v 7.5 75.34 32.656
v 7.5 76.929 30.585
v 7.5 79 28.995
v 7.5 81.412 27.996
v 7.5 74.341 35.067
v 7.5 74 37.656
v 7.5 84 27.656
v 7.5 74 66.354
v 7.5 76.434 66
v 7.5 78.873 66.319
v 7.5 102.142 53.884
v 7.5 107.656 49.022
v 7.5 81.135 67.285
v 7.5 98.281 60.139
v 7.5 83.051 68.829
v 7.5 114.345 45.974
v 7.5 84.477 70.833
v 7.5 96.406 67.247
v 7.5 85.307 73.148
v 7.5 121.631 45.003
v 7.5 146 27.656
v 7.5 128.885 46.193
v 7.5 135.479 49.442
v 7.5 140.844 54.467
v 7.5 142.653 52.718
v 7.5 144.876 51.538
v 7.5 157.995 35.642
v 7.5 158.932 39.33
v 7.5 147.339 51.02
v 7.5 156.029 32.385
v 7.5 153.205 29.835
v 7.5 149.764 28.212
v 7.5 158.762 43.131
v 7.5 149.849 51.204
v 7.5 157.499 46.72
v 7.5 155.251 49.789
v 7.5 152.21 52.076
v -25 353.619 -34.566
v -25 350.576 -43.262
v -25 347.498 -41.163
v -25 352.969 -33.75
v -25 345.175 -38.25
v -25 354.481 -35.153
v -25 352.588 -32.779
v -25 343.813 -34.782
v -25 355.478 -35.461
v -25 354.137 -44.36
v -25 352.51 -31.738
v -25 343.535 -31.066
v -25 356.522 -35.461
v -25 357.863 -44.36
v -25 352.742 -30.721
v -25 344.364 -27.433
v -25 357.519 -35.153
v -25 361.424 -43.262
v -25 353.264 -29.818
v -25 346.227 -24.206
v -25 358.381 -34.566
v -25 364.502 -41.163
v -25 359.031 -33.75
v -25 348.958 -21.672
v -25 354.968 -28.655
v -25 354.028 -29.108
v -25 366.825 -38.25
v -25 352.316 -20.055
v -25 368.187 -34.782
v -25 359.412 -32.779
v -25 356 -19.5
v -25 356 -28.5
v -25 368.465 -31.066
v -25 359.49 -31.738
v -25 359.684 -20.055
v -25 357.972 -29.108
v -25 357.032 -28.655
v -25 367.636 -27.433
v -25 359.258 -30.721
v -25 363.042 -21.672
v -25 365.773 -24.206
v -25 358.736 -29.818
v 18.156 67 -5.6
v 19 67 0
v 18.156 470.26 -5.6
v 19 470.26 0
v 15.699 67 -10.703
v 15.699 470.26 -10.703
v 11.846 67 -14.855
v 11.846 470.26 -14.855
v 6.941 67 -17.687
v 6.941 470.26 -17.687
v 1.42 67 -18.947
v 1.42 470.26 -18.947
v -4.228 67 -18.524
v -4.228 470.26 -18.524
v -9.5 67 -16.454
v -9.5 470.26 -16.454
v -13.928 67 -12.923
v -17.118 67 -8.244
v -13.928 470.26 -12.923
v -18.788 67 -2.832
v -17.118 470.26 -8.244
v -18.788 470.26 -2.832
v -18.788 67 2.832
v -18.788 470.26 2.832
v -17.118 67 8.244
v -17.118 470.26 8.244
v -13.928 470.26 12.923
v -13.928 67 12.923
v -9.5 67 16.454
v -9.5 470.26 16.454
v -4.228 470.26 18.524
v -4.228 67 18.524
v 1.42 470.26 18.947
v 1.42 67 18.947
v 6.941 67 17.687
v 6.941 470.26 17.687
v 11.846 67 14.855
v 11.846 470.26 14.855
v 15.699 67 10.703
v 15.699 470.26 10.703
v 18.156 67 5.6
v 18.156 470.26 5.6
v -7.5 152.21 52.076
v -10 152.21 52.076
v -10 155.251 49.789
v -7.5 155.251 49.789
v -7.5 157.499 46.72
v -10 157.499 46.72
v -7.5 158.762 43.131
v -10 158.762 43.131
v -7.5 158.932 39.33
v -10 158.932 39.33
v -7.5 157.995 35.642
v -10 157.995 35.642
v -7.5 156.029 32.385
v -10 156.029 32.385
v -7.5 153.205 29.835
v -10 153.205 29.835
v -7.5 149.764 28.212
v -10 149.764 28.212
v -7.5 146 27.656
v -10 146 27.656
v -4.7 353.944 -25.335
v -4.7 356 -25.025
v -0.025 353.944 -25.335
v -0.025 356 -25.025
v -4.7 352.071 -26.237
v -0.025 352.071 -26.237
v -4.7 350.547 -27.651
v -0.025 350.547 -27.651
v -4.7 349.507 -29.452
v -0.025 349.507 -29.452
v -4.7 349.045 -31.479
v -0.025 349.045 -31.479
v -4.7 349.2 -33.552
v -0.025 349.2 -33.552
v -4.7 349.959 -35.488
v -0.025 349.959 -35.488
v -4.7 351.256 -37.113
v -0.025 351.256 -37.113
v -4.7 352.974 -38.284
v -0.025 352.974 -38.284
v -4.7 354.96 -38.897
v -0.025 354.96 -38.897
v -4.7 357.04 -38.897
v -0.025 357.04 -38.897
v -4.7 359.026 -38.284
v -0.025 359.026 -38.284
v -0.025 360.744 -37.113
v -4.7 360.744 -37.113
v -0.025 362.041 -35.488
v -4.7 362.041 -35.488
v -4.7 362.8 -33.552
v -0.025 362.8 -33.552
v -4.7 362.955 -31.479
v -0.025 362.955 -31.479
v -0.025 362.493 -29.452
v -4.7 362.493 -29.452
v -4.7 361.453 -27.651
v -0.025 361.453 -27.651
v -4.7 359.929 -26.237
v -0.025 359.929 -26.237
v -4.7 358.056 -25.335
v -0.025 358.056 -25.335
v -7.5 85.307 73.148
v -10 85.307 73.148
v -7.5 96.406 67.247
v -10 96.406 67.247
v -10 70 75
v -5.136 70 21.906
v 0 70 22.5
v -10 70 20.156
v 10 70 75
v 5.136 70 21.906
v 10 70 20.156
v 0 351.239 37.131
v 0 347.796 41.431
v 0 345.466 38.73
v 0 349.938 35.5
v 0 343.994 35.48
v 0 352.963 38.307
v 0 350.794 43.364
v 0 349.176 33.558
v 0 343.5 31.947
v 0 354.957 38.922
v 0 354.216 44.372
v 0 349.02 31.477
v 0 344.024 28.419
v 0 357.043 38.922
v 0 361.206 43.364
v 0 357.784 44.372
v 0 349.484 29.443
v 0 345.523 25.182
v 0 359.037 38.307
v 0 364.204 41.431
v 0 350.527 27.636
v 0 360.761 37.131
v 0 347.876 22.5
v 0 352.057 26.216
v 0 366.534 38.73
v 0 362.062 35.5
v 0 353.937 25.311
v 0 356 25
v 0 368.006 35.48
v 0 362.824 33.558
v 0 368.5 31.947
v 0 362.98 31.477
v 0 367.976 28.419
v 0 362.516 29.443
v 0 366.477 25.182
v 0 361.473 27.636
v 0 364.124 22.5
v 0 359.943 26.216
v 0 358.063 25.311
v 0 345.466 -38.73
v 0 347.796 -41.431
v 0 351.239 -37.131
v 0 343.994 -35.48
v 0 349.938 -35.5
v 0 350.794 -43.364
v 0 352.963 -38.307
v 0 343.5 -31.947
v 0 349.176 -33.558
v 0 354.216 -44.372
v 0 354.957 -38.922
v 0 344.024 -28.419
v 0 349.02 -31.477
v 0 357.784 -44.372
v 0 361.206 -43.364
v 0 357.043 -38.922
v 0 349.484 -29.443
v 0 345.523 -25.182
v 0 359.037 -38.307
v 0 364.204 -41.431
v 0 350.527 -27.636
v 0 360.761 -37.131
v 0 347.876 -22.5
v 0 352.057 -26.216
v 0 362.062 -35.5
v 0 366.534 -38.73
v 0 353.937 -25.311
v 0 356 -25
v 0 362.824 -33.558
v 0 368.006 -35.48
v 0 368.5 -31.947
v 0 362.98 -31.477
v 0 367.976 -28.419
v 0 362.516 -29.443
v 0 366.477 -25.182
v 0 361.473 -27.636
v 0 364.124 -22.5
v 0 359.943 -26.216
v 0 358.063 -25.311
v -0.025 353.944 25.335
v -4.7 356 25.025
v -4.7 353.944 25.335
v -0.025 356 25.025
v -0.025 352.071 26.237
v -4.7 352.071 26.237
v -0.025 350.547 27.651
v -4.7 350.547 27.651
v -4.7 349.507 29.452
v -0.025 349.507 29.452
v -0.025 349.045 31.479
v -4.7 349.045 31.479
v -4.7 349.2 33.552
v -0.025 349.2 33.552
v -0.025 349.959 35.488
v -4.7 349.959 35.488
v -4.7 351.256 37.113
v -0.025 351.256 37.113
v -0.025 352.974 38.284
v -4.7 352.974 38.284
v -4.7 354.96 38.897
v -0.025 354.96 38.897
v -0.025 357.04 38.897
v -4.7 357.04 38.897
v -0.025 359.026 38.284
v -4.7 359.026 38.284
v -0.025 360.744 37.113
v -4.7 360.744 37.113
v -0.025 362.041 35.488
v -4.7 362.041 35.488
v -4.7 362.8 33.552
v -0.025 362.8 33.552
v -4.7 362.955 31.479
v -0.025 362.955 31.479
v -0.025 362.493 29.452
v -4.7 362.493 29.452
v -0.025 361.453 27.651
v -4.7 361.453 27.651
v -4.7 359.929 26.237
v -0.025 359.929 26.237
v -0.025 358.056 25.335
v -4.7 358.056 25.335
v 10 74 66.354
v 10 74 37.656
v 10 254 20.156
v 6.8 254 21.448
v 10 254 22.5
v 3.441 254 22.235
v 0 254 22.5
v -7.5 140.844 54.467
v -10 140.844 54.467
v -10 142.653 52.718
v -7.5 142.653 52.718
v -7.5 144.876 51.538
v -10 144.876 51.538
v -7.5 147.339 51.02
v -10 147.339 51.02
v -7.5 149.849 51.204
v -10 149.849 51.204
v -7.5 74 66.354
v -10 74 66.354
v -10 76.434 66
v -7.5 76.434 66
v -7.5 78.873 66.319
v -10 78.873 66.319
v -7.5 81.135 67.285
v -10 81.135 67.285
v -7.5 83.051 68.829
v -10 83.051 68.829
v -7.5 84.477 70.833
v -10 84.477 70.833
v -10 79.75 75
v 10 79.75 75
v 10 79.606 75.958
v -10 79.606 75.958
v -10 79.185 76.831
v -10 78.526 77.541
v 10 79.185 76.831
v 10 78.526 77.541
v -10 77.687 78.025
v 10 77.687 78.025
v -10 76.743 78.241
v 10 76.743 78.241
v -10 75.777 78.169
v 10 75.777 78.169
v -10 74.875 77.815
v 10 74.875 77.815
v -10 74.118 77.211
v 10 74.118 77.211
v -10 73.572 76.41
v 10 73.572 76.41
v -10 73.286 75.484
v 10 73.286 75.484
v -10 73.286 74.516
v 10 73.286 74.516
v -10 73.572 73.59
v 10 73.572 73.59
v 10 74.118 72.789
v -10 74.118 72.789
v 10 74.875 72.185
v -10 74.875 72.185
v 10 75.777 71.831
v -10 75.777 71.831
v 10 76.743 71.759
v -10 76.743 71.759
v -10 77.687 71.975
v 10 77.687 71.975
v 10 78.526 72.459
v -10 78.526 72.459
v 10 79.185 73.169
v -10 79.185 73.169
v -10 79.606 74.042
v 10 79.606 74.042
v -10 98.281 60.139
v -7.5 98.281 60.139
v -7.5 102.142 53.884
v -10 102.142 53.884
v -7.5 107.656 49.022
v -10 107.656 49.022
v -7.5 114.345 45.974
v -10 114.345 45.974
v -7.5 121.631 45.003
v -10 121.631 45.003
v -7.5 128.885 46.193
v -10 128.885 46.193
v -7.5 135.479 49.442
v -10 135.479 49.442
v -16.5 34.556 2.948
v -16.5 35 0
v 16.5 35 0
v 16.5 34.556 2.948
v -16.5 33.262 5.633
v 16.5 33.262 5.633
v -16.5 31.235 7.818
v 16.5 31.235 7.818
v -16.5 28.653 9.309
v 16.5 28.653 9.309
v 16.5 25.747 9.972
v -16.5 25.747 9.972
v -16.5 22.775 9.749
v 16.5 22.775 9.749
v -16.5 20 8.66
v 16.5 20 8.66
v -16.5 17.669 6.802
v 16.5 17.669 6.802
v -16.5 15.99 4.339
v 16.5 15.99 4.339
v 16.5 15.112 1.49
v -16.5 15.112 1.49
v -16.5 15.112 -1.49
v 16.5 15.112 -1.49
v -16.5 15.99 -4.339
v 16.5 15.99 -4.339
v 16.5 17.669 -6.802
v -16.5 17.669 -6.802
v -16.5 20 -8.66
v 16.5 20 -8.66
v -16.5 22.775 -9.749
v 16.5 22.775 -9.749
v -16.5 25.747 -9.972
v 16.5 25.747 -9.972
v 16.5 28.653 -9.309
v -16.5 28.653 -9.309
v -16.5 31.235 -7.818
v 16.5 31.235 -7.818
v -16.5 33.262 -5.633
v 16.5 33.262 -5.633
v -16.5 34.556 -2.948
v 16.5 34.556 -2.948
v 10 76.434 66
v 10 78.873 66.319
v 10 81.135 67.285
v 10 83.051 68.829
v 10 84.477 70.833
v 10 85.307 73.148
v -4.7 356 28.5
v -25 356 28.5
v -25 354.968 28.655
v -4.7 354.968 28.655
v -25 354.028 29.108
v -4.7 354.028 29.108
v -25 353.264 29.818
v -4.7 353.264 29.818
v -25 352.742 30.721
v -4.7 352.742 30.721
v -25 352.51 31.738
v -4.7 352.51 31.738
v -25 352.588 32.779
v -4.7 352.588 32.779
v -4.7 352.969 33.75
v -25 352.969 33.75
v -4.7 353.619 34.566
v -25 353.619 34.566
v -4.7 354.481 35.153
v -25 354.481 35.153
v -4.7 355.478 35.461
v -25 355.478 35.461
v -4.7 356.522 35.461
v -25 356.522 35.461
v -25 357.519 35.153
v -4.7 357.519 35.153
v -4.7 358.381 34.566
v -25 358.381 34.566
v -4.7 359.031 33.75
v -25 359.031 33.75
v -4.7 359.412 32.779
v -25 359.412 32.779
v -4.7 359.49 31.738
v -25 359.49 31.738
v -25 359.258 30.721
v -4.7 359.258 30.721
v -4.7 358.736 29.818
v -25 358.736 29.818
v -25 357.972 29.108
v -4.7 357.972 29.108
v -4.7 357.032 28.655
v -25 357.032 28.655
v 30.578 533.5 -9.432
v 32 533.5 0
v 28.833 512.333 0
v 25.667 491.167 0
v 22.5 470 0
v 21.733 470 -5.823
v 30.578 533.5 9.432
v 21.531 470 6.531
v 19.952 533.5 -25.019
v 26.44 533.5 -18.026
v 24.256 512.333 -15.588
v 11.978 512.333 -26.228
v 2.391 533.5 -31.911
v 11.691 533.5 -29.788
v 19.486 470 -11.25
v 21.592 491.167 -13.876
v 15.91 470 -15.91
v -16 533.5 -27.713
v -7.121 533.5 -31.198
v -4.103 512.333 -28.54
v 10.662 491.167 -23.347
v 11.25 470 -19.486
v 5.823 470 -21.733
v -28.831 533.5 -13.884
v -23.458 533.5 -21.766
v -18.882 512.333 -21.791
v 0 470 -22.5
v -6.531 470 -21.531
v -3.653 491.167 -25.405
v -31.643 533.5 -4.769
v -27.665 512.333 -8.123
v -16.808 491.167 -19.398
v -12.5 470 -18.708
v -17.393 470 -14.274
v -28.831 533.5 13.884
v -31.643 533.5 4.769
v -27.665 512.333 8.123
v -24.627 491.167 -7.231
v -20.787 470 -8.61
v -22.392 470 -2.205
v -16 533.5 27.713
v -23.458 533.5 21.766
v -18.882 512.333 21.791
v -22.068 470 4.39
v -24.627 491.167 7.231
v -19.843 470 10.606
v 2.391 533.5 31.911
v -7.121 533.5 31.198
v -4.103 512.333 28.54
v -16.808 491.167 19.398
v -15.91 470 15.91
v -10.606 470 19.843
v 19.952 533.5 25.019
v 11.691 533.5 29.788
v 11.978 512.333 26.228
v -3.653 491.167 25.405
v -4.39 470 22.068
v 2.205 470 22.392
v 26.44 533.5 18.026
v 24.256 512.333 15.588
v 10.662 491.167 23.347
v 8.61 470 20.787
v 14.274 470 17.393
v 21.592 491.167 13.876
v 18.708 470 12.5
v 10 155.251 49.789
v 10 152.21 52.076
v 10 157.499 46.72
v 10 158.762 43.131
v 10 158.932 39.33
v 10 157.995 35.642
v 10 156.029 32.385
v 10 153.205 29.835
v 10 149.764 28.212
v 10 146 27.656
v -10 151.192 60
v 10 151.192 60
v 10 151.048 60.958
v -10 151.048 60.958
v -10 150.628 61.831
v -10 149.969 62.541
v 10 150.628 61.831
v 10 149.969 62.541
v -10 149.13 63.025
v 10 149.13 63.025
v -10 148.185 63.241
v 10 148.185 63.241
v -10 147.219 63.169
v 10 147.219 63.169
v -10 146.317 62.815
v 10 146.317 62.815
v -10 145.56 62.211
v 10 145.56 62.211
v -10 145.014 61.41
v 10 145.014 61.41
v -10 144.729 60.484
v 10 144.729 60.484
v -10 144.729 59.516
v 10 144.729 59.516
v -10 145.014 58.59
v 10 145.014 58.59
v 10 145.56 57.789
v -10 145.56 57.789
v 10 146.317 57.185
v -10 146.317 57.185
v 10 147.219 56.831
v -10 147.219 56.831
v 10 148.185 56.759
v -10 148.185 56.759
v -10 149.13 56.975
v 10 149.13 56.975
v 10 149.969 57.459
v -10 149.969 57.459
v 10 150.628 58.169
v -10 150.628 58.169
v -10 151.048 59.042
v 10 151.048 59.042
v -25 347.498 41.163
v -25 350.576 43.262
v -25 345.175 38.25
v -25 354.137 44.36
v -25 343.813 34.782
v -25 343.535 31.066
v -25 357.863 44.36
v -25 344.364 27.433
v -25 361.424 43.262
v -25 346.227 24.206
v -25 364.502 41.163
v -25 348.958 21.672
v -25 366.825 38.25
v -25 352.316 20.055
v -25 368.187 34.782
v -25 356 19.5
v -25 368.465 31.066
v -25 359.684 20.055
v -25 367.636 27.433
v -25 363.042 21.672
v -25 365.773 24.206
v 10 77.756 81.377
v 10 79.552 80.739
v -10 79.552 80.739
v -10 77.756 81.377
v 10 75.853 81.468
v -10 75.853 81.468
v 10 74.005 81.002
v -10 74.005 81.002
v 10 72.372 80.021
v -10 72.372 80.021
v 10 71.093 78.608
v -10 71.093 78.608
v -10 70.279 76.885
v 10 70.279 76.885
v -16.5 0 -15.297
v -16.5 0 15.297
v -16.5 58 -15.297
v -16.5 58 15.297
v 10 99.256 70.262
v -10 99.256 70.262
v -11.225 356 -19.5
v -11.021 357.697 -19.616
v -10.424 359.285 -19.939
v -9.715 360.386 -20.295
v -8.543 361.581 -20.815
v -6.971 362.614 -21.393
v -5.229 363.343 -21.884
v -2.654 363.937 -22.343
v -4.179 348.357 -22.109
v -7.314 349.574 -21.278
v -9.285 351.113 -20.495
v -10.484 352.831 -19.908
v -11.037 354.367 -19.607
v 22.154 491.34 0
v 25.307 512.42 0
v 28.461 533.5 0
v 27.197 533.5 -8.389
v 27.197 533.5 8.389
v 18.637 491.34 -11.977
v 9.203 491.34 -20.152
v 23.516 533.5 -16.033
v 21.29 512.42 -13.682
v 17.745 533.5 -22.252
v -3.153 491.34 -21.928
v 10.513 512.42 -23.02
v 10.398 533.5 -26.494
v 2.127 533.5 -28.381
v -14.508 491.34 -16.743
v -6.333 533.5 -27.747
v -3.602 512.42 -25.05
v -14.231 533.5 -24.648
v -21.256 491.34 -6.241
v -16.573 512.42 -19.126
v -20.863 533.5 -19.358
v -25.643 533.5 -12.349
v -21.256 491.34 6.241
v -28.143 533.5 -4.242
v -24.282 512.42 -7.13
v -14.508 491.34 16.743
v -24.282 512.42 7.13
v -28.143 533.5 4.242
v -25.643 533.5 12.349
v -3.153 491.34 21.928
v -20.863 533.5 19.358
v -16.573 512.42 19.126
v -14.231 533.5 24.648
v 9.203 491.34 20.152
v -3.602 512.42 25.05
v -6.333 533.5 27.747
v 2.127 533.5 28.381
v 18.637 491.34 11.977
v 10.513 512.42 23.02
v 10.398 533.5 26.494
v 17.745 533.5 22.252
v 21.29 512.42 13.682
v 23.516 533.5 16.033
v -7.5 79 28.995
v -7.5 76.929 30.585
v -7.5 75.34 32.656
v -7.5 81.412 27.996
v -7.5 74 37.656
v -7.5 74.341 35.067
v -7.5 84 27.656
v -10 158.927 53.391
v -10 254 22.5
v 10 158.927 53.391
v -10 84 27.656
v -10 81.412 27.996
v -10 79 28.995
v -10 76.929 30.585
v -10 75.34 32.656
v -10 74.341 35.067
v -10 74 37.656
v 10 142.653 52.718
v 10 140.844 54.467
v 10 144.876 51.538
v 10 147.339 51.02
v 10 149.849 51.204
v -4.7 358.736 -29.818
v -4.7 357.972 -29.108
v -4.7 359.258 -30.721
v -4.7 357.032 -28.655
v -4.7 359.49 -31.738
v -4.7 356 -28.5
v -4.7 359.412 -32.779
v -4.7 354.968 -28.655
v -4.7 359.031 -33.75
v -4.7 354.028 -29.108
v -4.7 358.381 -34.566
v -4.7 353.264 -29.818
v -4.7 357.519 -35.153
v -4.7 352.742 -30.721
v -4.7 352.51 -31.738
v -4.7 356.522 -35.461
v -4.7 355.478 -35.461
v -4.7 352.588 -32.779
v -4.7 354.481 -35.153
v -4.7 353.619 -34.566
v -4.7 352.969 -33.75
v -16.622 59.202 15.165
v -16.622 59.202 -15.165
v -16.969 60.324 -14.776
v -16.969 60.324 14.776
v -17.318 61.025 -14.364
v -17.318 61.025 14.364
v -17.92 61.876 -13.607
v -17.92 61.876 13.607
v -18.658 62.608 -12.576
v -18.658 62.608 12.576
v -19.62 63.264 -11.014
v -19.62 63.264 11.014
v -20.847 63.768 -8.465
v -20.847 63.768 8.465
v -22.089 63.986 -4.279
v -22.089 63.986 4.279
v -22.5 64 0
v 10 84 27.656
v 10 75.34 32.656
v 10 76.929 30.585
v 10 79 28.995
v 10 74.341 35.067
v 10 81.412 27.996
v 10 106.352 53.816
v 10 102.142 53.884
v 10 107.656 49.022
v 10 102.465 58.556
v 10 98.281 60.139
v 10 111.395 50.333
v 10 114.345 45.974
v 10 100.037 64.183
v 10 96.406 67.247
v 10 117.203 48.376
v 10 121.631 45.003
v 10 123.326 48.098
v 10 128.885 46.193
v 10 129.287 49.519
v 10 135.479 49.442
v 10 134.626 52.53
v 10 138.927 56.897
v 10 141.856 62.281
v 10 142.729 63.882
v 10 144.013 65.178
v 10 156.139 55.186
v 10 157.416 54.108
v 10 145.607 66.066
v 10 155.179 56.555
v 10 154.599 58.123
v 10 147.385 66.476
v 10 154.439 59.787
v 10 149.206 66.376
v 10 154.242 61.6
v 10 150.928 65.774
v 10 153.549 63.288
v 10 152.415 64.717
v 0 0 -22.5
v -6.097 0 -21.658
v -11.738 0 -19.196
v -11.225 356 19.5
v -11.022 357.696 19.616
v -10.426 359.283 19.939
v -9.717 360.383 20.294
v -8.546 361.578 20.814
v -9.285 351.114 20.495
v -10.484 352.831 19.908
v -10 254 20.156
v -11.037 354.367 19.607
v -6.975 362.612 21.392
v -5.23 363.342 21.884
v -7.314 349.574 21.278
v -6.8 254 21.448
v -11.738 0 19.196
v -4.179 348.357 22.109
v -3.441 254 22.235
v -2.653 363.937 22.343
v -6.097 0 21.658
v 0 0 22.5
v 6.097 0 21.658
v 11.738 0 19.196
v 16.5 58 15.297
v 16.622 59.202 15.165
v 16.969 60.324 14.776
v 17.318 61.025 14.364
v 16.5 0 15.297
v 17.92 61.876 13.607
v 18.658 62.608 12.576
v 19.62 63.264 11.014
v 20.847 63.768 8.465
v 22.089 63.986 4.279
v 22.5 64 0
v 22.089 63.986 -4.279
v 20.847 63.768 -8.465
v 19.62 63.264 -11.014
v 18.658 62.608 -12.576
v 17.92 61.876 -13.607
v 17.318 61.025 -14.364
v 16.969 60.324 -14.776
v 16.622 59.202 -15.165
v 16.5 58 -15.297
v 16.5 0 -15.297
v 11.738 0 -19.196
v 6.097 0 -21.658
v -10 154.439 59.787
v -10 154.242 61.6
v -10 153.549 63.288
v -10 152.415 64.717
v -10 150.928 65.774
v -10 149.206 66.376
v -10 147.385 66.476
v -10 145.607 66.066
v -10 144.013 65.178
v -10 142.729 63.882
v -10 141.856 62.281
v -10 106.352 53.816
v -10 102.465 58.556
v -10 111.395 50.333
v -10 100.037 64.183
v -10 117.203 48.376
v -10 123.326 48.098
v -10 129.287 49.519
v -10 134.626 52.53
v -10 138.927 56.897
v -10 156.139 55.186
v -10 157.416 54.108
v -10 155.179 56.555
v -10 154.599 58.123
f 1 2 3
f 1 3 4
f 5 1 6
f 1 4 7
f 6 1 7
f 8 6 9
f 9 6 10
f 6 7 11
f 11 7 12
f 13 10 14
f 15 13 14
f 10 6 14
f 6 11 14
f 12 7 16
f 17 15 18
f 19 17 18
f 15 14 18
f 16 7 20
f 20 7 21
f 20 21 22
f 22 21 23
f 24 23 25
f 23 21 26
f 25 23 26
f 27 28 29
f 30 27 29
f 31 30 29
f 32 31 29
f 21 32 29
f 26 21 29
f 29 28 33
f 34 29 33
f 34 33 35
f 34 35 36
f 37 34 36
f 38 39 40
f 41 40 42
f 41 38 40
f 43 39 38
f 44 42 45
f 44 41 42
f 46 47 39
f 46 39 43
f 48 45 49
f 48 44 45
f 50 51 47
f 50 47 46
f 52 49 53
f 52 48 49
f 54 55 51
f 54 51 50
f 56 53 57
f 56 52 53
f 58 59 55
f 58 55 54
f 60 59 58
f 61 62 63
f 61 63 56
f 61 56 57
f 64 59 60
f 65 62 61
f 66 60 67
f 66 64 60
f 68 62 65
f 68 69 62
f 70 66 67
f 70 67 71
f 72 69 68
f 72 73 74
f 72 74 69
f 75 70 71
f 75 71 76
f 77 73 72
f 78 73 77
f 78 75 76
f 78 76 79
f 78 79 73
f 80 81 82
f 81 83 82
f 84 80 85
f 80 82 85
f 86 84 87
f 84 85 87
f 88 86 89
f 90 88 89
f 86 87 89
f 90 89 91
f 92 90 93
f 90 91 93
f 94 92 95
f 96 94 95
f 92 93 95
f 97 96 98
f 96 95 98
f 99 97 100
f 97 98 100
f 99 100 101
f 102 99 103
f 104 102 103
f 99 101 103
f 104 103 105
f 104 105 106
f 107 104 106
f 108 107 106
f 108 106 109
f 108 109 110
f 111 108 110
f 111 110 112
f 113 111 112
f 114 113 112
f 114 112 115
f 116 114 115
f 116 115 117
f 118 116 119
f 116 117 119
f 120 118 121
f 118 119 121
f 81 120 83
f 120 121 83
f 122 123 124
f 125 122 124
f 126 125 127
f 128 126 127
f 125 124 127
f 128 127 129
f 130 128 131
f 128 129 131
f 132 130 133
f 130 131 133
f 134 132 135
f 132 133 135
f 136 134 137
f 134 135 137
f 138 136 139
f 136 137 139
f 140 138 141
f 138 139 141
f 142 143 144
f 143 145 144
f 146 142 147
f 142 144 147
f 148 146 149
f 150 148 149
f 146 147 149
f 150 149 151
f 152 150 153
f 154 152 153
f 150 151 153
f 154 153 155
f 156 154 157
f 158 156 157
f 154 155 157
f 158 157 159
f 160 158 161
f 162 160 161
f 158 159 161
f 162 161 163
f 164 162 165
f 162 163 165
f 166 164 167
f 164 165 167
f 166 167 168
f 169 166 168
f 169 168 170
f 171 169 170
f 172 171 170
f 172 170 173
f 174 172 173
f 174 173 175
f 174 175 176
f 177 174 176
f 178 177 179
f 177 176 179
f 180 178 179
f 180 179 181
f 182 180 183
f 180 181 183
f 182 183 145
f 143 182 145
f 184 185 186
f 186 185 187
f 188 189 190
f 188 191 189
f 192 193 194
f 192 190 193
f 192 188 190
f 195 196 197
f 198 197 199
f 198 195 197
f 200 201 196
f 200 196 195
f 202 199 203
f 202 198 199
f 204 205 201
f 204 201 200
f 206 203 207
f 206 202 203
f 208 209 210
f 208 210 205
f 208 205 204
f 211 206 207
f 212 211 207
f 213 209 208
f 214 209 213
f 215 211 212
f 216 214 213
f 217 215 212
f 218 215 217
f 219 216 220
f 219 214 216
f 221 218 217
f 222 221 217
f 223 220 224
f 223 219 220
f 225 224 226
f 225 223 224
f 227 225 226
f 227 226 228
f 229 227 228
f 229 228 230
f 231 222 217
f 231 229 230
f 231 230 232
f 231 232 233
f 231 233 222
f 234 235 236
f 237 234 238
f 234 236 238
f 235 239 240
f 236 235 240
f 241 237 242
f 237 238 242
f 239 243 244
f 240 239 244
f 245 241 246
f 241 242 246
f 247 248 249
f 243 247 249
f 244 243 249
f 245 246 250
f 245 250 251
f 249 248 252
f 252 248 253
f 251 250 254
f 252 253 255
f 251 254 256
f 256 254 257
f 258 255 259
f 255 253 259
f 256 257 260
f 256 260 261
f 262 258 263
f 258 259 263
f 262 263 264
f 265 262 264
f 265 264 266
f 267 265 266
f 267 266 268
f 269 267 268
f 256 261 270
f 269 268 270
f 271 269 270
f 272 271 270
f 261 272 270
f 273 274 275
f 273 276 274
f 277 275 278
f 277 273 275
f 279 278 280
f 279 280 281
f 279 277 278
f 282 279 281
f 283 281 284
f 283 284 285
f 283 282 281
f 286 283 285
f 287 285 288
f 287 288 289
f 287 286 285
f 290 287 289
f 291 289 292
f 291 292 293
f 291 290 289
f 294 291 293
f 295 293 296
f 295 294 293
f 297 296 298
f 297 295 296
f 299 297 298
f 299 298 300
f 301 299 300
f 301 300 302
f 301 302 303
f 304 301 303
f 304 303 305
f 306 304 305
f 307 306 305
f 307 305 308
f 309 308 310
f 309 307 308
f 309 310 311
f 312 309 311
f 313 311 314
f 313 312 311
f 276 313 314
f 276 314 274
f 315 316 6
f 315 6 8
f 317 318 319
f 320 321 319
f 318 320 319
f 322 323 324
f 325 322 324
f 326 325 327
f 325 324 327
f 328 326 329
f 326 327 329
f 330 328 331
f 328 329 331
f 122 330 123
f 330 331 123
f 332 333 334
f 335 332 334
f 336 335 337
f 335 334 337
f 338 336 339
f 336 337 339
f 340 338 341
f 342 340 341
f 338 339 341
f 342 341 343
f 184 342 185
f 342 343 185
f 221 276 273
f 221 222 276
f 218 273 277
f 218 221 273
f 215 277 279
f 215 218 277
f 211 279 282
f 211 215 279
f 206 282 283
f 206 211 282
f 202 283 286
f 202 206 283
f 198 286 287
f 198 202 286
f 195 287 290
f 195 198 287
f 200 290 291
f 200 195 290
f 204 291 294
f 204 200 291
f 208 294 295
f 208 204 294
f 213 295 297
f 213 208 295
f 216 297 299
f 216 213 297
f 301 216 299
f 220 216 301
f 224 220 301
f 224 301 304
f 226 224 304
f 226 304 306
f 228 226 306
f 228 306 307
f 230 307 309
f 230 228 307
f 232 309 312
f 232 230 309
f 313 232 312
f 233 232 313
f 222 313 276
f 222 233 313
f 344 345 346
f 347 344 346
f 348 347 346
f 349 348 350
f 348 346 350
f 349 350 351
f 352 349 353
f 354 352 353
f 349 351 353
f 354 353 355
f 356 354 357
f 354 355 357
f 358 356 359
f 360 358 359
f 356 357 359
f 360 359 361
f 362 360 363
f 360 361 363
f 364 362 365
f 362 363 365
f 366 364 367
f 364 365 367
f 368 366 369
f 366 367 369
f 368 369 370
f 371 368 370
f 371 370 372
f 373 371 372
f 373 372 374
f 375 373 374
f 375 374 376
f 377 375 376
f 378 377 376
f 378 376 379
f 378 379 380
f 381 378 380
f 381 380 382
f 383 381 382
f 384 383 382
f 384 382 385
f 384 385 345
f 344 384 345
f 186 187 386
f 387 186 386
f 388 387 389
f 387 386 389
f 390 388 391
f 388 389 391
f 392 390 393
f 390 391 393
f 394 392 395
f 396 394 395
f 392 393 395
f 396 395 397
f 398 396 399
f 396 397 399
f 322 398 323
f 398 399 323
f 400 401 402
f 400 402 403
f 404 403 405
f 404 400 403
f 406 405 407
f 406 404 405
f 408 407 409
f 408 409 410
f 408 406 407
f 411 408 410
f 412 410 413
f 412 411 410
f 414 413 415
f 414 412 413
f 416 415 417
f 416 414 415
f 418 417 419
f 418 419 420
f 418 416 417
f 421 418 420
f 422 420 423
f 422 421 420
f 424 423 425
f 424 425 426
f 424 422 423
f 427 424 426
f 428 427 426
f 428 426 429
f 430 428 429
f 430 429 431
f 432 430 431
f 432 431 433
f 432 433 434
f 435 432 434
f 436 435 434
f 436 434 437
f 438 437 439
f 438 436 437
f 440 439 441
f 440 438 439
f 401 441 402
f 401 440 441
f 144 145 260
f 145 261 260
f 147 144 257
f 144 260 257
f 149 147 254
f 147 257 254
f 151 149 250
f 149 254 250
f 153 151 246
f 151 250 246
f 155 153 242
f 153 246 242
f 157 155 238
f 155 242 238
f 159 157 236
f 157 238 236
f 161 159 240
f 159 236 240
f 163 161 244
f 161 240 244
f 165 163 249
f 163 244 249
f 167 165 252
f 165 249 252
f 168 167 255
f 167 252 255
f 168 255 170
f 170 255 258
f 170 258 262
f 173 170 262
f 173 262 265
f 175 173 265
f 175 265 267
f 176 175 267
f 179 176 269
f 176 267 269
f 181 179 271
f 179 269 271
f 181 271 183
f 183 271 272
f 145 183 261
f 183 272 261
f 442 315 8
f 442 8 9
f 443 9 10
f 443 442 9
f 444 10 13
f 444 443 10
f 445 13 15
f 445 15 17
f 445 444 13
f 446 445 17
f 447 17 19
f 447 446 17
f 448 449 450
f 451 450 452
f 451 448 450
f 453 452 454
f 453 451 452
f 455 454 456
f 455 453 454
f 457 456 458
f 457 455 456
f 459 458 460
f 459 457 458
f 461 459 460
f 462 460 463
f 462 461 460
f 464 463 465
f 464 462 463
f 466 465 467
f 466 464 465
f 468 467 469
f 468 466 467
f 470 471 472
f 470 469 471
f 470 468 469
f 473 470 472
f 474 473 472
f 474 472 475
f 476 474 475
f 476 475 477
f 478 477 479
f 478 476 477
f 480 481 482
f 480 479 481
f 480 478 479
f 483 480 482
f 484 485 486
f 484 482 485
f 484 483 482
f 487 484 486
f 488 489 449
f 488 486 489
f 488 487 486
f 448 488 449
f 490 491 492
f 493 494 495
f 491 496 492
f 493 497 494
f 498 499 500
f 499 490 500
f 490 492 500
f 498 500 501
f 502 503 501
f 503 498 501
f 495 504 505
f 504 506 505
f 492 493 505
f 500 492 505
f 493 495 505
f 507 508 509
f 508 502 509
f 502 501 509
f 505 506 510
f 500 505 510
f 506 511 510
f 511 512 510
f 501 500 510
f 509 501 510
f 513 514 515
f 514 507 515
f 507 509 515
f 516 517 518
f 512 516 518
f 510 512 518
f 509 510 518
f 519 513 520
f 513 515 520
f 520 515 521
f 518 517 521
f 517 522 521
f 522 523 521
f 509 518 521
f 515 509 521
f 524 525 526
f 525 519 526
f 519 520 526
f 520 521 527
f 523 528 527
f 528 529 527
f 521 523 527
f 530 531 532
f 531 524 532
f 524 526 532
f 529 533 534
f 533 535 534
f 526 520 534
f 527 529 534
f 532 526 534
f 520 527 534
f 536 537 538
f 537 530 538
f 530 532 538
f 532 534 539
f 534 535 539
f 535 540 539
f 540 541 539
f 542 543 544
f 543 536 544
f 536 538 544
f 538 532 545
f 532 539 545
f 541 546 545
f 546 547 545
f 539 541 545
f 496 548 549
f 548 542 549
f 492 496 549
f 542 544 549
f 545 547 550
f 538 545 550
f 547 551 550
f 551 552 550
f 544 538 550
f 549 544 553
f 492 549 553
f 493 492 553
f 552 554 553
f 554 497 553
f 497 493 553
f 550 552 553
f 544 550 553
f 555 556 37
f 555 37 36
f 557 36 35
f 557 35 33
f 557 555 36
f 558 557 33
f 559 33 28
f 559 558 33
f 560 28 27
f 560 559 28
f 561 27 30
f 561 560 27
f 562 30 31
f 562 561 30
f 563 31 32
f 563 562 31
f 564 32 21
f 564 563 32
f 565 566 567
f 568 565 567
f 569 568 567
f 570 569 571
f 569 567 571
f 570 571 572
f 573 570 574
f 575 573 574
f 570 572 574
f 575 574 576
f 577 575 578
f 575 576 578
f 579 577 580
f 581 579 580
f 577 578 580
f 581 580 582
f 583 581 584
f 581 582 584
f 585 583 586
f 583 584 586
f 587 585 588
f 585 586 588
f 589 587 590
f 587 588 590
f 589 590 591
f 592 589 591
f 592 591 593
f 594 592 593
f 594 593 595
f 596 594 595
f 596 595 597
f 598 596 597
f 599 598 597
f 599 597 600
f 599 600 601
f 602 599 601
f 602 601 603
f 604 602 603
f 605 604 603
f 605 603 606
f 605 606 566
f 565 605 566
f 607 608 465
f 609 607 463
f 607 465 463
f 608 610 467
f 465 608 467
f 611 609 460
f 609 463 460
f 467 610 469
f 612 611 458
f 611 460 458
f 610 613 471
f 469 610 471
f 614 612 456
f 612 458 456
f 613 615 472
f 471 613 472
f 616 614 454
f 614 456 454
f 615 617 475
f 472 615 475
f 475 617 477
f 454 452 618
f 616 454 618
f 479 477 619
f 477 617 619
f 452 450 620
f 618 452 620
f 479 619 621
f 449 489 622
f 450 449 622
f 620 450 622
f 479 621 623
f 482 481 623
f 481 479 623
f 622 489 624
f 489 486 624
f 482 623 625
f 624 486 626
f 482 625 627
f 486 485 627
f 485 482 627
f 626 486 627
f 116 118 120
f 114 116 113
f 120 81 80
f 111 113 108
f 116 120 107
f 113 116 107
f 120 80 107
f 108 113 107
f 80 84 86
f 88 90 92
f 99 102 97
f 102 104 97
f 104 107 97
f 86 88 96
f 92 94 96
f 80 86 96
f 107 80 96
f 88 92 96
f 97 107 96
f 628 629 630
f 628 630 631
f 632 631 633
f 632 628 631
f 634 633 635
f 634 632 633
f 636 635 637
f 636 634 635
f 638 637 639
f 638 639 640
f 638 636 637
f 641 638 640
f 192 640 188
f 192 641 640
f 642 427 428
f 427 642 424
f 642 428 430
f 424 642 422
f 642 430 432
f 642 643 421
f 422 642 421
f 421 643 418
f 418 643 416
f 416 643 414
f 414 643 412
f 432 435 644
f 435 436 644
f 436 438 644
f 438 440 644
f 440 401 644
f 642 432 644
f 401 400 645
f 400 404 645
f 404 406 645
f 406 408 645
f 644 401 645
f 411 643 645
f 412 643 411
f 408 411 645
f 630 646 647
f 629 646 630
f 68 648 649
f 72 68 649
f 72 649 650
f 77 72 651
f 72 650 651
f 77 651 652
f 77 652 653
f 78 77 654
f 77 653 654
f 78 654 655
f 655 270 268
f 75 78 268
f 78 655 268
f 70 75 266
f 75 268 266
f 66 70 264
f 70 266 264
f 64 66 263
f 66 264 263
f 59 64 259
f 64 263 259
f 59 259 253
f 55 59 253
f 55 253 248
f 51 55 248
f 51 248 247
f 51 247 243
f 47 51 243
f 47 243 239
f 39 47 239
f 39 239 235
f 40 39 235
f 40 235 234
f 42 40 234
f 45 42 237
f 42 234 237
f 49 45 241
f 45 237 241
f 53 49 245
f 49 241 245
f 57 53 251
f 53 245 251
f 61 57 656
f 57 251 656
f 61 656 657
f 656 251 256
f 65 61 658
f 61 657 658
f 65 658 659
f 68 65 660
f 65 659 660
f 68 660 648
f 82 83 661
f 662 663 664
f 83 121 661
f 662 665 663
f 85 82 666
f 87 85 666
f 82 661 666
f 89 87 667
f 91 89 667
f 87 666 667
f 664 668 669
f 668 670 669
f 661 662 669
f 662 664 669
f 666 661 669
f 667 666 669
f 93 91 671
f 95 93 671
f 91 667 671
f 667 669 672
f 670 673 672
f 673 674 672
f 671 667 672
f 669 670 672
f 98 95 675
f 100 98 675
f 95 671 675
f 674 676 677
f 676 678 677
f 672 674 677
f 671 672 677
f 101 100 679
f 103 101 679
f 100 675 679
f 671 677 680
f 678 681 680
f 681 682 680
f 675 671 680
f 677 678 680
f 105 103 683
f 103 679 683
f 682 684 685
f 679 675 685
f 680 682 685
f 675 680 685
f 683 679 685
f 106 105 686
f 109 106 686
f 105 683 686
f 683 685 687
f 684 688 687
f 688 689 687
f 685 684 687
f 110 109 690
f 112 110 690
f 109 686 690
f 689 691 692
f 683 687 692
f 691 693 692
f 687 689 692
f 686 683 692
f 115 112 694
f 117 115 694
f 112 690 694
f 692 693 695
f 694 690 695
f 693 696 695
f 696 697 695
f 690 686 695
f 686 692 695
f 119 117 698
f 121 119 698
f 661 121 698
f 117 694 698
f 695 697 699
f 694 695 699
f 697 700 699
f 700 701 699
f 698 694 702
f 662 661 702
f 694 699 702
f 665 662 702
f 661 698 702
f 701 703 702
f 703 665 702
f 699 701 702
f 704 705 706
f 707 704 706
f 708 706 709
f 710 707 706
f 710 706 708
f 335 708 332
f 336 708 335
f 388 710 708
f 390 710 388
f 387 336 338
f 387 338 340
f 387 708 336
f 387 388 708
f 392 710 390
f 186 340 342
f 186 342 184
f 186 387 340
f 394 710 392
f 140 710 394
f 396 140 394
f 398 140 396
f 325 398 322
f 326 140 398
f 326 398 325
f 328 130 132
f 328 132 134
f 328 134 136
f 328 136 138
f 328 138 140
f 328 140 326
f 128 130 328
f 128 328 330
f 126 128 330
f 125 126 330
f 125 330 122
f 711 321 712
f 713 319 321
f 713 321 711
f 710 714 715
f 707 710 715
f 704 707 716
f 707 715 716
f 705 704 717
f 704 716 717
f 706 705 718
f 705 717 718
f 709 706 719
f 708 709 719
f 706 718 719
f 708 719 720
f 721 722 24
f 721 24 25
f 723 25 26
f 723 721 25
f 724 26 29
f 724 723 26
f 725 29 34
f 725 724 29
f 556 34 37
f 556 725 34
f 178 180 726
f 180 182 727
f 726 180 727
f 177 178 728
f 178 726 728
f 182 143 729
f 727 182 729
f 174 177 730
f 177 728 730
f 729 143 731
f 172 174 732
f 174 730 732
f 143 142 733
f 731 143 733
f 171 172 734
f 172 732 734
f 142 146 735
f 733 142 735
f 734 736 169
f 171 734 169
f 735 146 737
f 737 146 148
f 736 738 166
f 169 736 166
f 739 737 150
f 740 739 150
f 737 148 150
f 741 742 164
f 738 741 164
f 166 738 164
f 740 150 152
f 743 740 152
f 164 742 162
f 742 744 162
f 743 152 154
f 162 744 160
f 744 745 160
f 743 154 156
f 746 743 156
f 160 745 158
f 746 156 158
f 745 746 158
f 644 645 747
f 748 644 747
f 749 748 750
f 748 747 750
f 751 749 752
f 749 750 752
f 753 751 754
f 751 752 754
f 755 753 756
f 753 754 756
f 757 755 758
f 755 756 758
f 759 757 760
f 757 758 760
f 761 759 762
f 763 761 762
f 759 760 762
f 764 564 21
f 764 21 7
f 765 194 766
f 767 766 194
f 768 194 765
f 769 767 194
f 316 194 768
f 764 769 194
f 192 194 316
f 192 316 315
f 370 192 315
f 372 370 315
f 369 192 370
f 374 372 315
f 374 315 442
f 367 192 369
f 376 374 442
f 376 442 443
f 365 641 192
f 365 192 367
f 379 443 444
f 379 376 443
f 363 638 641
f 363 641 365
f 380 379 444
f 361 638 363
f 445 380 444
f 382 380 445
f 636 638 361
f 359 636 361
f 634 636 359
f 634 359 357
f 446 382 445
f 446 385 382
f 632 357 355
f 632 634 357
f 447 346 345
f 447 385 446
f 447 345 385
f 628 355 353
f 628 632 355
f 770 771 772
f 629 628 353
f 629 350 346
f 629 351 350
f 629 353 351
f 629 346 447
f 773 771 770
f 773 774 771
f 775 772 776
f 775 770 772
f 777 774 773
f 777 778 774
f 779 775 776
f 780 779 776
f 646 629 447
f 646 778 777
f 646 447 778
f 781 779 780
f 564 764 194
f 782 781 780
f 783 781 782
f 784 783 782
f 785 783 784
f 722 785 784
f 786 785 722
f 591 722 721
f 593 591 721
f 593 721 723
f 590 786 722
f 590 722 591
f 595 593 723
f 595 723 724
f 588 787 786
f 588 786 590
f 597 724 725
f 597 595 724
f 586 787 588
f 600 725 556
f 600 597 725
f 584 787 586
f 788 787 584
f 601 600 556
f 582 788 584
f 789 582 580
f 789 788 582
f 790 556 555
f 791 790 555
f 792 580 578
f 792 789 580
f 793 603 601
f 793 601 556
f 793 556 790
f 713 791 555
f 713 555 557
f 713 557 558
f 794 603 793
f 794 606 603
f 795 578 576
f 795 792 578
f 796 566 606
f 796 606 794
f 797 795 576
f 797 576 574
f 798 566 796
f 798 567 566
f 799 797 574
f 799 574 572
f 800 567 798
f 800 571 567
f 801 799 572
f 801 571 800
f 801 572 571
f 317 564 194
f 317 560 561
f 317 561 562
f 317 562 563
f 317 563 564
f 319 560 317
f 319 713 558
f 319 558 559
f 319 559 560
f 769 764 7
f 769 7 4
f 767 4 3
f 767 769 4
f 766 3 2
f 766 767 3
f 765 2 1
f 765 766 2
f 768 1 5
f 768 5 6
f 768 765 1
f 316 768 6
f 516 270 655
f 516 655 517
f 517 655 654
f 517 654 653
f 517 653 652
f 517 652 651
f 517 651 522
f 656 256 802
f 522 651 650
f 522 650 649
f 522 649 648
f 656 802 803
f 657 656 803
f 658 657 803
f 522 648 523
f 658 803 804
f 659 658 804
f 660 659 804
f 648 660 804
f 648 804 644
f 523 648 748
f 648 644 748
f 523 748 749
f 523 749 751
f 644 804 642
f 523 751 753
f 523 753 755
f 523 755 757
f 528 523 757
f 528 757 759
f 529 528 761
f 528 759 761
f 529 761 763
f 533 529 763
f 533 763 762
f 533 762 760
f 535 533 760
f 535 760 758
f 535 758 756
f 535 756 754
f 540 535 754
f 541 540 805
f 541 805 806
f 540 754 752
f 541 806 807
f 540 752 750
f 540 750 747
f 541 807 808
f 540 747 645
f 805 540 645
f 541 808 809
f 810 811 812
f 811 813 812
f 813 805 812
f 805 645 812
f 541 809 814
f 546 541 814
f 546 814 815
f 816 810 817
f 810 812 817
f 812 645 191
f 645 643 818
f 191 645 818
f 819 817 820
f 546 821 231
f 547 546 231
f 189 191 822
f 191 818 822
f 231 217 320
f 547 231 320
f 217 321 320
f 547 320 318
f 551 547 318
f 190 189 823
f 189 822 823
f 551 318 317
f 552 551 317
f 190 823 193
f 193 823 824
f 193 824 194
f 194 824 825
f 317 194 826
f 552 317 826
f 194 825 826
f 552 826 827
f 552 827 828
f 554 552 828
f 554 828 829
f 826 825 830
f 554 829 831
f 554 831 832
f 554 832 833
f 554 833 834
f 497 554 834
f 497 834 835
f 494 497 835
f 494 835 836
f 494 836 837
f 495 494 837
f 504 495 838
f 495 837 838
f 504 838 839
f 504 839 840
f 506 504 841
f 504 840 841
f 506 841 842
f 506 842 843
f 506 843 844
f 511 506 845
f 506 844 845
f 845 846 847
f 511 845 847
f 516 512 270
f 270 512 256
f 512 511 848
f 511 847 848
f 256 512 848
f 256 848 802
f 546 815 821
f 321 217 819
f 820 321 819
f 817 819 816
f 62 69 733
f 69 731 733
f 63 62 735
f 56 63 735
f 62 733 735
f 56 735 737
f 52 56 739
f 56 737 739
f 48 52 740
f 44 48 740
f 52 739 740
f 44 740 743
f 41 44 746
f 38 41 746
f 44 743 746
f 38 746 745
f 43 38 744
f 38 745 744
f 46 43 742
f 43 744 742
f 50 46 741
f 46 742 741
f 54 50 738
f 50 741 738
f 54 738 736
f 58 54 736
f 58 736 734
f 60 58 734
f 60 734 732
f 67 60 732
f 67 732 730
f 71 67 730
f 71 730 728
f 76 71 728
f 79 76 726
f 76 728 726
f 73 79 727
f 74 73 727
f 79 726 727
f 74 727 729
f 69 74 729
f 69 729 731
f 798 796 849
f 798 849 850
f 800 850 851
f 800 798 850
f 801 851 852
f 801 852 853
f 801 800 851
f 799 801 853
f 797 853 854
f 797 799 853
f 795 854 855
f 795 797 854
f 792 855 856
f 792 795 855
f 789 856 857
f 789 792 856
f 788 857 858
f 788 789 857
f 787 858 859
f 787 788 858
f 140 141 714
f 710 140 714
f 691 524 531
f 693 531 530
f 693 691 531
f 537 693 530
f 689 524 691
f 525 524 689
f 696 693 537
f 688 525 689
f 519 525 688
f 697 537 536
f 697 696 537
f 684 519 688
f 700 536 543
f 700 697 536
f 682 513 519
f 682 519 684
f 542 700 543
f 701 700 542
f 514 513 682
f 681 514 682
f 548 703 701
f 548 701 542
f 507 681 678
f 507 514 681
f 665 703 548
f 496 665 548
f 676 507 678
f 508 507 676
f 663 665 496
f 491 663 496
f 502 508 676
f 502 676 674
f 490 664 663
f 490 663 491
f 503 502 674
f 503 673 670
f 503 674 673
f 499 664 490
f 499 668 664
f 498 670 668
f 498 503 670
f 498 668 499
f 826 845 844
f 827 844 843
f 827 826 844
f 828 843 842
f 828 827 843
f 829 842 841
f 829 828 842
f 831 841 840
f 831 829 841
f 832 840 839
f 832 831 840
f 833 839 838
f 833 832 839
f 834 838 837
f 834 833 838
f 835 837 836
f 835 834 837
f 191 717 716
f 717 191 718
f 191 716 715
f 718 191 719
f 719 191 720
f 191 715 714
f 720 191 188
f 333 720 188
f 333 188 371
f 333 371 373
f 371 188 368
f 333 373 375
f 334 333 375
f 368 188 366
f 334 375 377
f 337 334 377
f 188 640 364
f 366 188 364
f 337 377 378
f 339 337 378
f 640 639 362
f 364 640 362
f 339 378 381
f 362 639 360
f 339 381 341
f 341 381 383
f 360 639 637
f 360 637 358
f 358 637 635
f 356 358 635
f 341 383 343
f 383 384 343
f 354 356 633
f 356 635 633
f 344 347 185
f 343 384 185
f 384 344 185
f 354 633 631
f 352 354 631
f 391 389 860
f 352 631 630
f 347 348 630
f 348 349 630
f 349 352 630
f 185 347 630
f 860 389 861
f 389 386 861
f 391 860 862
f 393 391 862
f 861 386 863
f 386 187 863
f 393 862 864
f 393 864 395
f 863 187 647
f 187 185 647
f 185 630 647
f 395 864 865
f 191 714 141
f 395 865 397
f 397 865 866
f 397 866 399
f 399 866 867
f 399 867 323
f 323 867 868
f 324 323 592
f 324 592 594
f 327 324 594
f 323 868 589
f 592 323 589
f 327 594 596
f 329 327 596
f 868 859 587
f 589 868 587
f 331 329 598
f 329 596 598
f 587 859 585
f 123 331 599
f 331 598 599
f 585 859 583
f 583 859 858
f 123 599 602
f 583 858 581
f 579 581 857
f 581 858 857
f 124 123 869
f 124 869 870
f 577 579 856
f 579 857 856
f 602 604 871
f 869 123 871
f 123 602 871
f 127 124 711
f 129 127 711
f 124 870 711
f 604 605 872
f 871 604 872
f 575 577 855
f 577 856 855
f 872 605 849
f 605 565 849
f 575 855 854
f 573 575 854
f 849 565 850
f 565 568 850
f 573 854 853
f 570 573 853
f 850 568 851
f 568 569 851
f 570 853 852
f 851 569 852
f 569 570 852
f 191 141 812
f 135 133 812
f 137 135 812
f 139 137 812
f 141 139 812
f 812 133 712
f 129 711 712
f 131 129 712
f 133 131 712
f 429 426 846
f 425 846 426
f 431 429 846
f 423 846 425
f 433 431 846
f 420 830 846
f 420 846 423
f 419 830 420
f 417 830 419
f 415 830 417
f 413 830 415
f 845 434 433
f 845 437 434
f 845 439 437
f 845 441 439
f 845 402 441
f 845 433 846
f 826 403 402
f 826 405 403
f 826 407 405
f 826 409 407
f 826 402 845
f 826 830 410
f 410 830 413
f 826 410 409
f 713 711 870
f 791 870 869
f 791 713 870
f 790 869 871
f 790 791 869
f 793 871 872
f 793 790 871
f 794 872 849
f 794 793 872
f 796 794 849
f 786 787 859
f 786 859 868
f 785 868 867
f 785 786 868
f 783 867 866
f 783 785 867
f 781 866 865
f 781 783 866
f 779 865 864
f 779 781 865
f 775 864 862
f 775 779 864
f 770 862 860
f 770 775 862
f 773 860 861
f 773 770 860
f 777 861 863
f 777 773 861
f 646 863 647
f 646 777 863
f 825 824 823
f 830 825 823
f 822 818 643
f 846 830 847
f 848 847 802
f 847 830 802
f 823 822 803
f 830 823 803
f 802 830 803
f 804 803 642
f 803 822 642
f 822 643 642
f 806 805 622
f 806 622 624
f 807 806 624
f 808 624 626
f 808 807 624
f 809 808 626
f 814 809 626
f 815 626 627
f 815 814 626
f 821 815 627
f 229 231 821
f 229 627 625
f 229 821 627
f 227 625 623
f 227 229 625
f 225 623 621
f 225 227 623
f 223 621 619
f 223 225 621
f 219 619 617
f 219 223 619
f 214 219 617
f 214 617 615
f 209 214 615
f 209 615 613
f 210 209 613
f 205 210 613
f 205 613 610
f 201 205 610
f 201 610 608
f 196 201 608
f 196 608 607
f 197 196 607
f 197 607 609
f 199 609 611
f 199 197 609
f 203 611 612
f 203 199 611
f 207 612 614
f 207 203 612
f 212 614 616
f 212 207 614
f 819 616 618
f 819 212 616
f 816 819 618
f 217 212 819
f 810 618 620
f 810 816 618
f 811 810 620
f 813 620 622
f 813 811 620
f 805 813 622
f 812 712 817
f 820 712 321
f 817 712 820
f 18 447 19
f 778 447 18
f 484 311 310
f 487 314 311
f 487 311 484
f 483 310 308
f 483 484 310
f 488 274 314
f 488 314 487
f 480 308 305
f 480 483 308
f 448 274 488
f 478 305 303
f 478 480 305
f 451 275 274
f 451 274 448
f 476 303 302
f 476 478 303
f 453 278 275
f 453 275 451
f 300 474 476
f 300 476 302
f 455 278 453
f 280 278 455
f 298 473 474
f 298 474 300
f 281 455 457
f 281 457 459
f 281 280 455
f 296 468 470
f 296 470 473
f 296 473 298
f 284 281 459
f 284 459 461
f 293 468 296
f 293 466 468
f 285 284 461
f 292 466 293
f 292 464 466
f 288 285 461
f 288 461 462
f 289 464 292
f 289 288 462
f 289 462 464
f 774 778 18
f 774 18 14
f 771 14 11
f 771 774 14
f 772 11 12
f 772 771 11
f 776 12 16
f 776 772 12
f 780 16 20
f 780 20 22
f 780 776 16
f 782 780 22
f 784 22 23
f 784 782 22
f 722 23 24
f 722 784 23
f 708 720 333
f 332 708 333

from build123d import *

# Parameters (mm, degrees)
SKETCH1_R                = 22.5
BOSS_EXTRUDE1_DEPTH      = 470
SKETCH2_R                = 32
CUT_EXTRUDE1_DEPTH       = 536.415959904
HOLE1_START              = -16.5
HOLE1_OUTLINE_R          = 10
HOLE1_DEPTH              = 33
SKETCH5_R                = 12.5
BOSS_EXTRUDE2_DEPTH      = 25
BOSS_EXTRUDE3_REACH      = 553.123
BOSS_EXTRUDE3_END_RADIUS = 22.5
SKETCH8_W                = 20
SKETCH8_H                = 184
CUT_EXTRUDE2_DEPTH       = 543.665873365
SKETCH11_R               = 3.25
CUT_EXTRUDE3_DEPTH       = 542.321069343
CUT_EXTRUDE4_DEPTH       = 2.5


# Read off the part's stored shape, not the designer's step: Shell1, Hole1
with BuildPart() as part:
    # Sketch1 → Boss-Extrude1 (new body)
    with BuildSketch(Plane(origin=(0, 0, 0), x_dir=(1, 0, 0), z_dir=(0, 1, 0))):
        with Locations(Location((0, 0, 0), (0, 0, 90))):
            Circle(SKETCH1_R)
    extrude(amount=BOSS_EXTRUDE1_DEPTH)

    # Sketch2 → section 0 of loft1
    with BuildSketch(Plane(origin=(0, 533.5, 0), x_dir=(1, 0, 0), z_dir=(0, 1, 0)), mode=Mode.PRIVATE) as loft1_s0:
        Circle(SKETCH2_R)
    # loft up to a face of the part (loft1)
    loft([loft1_s0.sketch, Face(Wire([part.edges().sort_by_distance((-16.401794117, 470, 15.402309883))[0]]))])

    # Shell1 outline → Shell1 (revolve, cut)
    with BuildSketch(Plane.XY):
        Polygon((28.461048171, 533.5), (0, 533.5), (0, 67), (19, 67), (19, 470.260362226), align=None)
    revolve(axis=Axis((0, 0, 0), (0, 1, 0)), mode=Mode.SUBTRACT)

    # Sketch3 → Cut-Extrude1 (cut, symmetric)
    with BuildSketch(Plane.XY):
        with BuildLine():
            Line((22.5, 64), (44.504485309, 64))
            Line((44.504485309, 64), (44.504485309, -12.1793828))
            Line((44.504485309, -12.1793828), (16.5, -12.1793828))
            Line((16.5, -12.1793828), (16.5, 58))
            ThreePointArc((16.5, 58), (18.257359313, 62.242640687), (22.5, 64))
        make_face()
    cut_extrude1 = extrude(amount=CUT_EXTRUDE1_DEPTH, both=True, mode=Mode.SUBTRACT)

    # Mirror1: Cut-Extrude1 across plane
    add(cut_extrude1.mirror(Plane(origin=(0, 0, 0), x_dir=(0, 0, 1), z_dir=(1, 0, 0))), mode=Mode.SUBTRACT)

    # Hole1 outline → Hole1 (cut)
    with BuildSketch(Plane.YZ.offset(HOLE1_START)):
        with Locations((25, 0)):
            Circle(HOLE1_OUTLINE_R)
    extrude(amount=HOLE1_DEPTH, mode=Mode.SUBTRACT)

    # Sketch5 → Boss-Extrude2 (add)
    with BuildSketch(Plane(origin=(0, 0, 0), x_dir=(0, 0, -1), z_dir=(1, 0, 0))):
        with Locations((-32, 356)):
            Circle(SKETCH5_R)
    boss_extrude2 = extrude(amount=-BOSS_EXTRUDE2_DEPTH)

    # Sketch7 → CBORE for M6 Hex Head Machine Screw1 (revolve, cut)
    with BuildSketch(Plane(origin=(0, 356, 32), x_dir=(0, 0, -1), z_dir=(0, 1, 0))):
        Polygon((0, 0), (0, 32.0001), (3.5, 32.0001), (3.5, 4.7), (6.975, 4.7), (6.975, 0.025), (7, 0), align=None)
    cbore_for_m6_hex_head_machine_screw1 = revolve(axis=Axis((6.35, 356, 32), (-1, 0, 0)), mode=Mode.SUBTRACT)

    # Mirror2: Boss-Extrude2, CBORE for M6 Hex Head Machine Screw1 across plane
    add(boss_extrude2.mirror(Plane.XY))
    add(cbore_for_m6_hex_head_machine_screw1.mirror(Plane.XY), mode=Mode.SUBTRACT)

    # Boss-Extrude3: up to this cylinder (the profile starts outside it)
    boss_extrude3_end = Plane(origin=(0, 162, 0), z_dir=(0, -1, 0)) * Cylinder(BOSS_EXTRUDE3_END_RADIUS, 1152.246, mode=Mode.PRIVATE)
    # Sketch8 → Boss-Extrude3 (add, up to the surface)
    with BuildSketch(Plane.XY.offset(90), mode=Mode.PRIVATE) as boss_extrude3_sk1:
        with Locations((0, 162)):
            Rectangle(SKETCH8_W, SKETCH8_H)
    boss_extrude3_tool1 = extrude(boss_extrude3_sk1.sketch, amount=-BOSS_EXTRUDE3_REACH, mode=Mode.PRIVATE) - boss_extrude3_end
    add(boss_extrude3_tool1.solids().sort_by_distance((0, 162, 90))[0])

    # Sketch10 → Cut-Extrude2 (cut, through all)
    with BuildSketch(Plane(origin=(10, 0, 0), x_dir=(0, 0, -1), z_dir=(1, 0, 0))):
        with BuildLine():
            Line((-90, 70), (-90, 254))
            Line((-90, 254), (-22.5, 254))
            Line((-22.5, 254), (-53.39120023, 158.926661609))
            ThreePointArc((-53.39120023, 158.926661609), (-55.83933924, 155.614626187), (-59.786533793, 154.438778235))
            ThreePointArc((-59.786533793, 154.438778235), (-66.375955373, 149.206085442), (-62.280701754, 141.855544753))
            ThreePointArc((-62.280701754, 141.855544753), (-48.37626649, 117.202834204), (-70.262213343, 99.255834796))
            Line((-70.262213343, 99.255834796), (-80.739159354, 79.551565158))
            ThreePointArc((-80.739159354, 79.551565158), (-80.571587455, 73.152252513), (-75, 70))
            Line((-75, 70), (-90, 70))
        make_face()
    extrude(amount=-CUT_EXTRUDE2_DEPTH, mode=Mode.SUBTRACT)

    # Sketch11 → Cut-Extrude3 (cut, through all)
    with BuildSketch(Plane(origin=(10, 0, 0), x_dir=(0, 0, -1), z_dir=(1, 0, 0))):
        with Locations(Location((-60, 147.942284398, 0), (0, 0, 90))):
            Circle(SKETCH11_R)
        with Locations(Location((-75, 76.5, 0), (0, 0, 90))):
            Circle(SKETCH11_R)
    extrude(amount=-CUT_EXTRUDE3_DEPTH, mode=Mode.SUBTRACT)

    # Sketch12 → Cut-Extrude4 (cut)
    with BuildSketch(Plane(origin=(10, 0, 0), x_dir=(0, 0, -1), z_dir=(1, 0, 0))):
        with BuildLine():
            Line((-27.655644371, 146), (-27.655644371, 84))
            ThreePointArc((-27.655644371, 84), (-30.584576559, 76.928932188), (-37.655644371, 74))
            Line((-37.655644371, 74), (-66.354191767, 74))
            ThreePointArc((-66.354191767, 74), (-67.285494294, 81.135342674), (-73.14840788, 85.307474475))
            Line((-73.14840788, 85.307474475), (-67.247053013, 96.406308753))
            ThreePointArc((-67.247053013, 96.406308753), (-45.973818024, 114.344671566), (-54.467499716, 140.843591518))
            ThreePointArc((-54.467499716, 140.843591518), (-51.192765452, 146.089551388), (-52.076348436, 152.210275248))
            ThreePointArc((-52.076348436, 152.210275248), (-37.4516744, 158.598991088), (-27.655644371, 146))
        make_face()
    cut_extrude4 = extrude(amount=-CUT_EXTRUDE4_DEPTH, mode=Mode.SUBTRACT)

    # Mirror3: Cut-Extrude4 across plane
    add(cut_extrude4.mirror(Plane(origin=(0, 0, 0), x_dir=(0, 0, 1), z_dir=(1, 0, 0))), mode=Mode.SUBTRACT)


solid = part.part
